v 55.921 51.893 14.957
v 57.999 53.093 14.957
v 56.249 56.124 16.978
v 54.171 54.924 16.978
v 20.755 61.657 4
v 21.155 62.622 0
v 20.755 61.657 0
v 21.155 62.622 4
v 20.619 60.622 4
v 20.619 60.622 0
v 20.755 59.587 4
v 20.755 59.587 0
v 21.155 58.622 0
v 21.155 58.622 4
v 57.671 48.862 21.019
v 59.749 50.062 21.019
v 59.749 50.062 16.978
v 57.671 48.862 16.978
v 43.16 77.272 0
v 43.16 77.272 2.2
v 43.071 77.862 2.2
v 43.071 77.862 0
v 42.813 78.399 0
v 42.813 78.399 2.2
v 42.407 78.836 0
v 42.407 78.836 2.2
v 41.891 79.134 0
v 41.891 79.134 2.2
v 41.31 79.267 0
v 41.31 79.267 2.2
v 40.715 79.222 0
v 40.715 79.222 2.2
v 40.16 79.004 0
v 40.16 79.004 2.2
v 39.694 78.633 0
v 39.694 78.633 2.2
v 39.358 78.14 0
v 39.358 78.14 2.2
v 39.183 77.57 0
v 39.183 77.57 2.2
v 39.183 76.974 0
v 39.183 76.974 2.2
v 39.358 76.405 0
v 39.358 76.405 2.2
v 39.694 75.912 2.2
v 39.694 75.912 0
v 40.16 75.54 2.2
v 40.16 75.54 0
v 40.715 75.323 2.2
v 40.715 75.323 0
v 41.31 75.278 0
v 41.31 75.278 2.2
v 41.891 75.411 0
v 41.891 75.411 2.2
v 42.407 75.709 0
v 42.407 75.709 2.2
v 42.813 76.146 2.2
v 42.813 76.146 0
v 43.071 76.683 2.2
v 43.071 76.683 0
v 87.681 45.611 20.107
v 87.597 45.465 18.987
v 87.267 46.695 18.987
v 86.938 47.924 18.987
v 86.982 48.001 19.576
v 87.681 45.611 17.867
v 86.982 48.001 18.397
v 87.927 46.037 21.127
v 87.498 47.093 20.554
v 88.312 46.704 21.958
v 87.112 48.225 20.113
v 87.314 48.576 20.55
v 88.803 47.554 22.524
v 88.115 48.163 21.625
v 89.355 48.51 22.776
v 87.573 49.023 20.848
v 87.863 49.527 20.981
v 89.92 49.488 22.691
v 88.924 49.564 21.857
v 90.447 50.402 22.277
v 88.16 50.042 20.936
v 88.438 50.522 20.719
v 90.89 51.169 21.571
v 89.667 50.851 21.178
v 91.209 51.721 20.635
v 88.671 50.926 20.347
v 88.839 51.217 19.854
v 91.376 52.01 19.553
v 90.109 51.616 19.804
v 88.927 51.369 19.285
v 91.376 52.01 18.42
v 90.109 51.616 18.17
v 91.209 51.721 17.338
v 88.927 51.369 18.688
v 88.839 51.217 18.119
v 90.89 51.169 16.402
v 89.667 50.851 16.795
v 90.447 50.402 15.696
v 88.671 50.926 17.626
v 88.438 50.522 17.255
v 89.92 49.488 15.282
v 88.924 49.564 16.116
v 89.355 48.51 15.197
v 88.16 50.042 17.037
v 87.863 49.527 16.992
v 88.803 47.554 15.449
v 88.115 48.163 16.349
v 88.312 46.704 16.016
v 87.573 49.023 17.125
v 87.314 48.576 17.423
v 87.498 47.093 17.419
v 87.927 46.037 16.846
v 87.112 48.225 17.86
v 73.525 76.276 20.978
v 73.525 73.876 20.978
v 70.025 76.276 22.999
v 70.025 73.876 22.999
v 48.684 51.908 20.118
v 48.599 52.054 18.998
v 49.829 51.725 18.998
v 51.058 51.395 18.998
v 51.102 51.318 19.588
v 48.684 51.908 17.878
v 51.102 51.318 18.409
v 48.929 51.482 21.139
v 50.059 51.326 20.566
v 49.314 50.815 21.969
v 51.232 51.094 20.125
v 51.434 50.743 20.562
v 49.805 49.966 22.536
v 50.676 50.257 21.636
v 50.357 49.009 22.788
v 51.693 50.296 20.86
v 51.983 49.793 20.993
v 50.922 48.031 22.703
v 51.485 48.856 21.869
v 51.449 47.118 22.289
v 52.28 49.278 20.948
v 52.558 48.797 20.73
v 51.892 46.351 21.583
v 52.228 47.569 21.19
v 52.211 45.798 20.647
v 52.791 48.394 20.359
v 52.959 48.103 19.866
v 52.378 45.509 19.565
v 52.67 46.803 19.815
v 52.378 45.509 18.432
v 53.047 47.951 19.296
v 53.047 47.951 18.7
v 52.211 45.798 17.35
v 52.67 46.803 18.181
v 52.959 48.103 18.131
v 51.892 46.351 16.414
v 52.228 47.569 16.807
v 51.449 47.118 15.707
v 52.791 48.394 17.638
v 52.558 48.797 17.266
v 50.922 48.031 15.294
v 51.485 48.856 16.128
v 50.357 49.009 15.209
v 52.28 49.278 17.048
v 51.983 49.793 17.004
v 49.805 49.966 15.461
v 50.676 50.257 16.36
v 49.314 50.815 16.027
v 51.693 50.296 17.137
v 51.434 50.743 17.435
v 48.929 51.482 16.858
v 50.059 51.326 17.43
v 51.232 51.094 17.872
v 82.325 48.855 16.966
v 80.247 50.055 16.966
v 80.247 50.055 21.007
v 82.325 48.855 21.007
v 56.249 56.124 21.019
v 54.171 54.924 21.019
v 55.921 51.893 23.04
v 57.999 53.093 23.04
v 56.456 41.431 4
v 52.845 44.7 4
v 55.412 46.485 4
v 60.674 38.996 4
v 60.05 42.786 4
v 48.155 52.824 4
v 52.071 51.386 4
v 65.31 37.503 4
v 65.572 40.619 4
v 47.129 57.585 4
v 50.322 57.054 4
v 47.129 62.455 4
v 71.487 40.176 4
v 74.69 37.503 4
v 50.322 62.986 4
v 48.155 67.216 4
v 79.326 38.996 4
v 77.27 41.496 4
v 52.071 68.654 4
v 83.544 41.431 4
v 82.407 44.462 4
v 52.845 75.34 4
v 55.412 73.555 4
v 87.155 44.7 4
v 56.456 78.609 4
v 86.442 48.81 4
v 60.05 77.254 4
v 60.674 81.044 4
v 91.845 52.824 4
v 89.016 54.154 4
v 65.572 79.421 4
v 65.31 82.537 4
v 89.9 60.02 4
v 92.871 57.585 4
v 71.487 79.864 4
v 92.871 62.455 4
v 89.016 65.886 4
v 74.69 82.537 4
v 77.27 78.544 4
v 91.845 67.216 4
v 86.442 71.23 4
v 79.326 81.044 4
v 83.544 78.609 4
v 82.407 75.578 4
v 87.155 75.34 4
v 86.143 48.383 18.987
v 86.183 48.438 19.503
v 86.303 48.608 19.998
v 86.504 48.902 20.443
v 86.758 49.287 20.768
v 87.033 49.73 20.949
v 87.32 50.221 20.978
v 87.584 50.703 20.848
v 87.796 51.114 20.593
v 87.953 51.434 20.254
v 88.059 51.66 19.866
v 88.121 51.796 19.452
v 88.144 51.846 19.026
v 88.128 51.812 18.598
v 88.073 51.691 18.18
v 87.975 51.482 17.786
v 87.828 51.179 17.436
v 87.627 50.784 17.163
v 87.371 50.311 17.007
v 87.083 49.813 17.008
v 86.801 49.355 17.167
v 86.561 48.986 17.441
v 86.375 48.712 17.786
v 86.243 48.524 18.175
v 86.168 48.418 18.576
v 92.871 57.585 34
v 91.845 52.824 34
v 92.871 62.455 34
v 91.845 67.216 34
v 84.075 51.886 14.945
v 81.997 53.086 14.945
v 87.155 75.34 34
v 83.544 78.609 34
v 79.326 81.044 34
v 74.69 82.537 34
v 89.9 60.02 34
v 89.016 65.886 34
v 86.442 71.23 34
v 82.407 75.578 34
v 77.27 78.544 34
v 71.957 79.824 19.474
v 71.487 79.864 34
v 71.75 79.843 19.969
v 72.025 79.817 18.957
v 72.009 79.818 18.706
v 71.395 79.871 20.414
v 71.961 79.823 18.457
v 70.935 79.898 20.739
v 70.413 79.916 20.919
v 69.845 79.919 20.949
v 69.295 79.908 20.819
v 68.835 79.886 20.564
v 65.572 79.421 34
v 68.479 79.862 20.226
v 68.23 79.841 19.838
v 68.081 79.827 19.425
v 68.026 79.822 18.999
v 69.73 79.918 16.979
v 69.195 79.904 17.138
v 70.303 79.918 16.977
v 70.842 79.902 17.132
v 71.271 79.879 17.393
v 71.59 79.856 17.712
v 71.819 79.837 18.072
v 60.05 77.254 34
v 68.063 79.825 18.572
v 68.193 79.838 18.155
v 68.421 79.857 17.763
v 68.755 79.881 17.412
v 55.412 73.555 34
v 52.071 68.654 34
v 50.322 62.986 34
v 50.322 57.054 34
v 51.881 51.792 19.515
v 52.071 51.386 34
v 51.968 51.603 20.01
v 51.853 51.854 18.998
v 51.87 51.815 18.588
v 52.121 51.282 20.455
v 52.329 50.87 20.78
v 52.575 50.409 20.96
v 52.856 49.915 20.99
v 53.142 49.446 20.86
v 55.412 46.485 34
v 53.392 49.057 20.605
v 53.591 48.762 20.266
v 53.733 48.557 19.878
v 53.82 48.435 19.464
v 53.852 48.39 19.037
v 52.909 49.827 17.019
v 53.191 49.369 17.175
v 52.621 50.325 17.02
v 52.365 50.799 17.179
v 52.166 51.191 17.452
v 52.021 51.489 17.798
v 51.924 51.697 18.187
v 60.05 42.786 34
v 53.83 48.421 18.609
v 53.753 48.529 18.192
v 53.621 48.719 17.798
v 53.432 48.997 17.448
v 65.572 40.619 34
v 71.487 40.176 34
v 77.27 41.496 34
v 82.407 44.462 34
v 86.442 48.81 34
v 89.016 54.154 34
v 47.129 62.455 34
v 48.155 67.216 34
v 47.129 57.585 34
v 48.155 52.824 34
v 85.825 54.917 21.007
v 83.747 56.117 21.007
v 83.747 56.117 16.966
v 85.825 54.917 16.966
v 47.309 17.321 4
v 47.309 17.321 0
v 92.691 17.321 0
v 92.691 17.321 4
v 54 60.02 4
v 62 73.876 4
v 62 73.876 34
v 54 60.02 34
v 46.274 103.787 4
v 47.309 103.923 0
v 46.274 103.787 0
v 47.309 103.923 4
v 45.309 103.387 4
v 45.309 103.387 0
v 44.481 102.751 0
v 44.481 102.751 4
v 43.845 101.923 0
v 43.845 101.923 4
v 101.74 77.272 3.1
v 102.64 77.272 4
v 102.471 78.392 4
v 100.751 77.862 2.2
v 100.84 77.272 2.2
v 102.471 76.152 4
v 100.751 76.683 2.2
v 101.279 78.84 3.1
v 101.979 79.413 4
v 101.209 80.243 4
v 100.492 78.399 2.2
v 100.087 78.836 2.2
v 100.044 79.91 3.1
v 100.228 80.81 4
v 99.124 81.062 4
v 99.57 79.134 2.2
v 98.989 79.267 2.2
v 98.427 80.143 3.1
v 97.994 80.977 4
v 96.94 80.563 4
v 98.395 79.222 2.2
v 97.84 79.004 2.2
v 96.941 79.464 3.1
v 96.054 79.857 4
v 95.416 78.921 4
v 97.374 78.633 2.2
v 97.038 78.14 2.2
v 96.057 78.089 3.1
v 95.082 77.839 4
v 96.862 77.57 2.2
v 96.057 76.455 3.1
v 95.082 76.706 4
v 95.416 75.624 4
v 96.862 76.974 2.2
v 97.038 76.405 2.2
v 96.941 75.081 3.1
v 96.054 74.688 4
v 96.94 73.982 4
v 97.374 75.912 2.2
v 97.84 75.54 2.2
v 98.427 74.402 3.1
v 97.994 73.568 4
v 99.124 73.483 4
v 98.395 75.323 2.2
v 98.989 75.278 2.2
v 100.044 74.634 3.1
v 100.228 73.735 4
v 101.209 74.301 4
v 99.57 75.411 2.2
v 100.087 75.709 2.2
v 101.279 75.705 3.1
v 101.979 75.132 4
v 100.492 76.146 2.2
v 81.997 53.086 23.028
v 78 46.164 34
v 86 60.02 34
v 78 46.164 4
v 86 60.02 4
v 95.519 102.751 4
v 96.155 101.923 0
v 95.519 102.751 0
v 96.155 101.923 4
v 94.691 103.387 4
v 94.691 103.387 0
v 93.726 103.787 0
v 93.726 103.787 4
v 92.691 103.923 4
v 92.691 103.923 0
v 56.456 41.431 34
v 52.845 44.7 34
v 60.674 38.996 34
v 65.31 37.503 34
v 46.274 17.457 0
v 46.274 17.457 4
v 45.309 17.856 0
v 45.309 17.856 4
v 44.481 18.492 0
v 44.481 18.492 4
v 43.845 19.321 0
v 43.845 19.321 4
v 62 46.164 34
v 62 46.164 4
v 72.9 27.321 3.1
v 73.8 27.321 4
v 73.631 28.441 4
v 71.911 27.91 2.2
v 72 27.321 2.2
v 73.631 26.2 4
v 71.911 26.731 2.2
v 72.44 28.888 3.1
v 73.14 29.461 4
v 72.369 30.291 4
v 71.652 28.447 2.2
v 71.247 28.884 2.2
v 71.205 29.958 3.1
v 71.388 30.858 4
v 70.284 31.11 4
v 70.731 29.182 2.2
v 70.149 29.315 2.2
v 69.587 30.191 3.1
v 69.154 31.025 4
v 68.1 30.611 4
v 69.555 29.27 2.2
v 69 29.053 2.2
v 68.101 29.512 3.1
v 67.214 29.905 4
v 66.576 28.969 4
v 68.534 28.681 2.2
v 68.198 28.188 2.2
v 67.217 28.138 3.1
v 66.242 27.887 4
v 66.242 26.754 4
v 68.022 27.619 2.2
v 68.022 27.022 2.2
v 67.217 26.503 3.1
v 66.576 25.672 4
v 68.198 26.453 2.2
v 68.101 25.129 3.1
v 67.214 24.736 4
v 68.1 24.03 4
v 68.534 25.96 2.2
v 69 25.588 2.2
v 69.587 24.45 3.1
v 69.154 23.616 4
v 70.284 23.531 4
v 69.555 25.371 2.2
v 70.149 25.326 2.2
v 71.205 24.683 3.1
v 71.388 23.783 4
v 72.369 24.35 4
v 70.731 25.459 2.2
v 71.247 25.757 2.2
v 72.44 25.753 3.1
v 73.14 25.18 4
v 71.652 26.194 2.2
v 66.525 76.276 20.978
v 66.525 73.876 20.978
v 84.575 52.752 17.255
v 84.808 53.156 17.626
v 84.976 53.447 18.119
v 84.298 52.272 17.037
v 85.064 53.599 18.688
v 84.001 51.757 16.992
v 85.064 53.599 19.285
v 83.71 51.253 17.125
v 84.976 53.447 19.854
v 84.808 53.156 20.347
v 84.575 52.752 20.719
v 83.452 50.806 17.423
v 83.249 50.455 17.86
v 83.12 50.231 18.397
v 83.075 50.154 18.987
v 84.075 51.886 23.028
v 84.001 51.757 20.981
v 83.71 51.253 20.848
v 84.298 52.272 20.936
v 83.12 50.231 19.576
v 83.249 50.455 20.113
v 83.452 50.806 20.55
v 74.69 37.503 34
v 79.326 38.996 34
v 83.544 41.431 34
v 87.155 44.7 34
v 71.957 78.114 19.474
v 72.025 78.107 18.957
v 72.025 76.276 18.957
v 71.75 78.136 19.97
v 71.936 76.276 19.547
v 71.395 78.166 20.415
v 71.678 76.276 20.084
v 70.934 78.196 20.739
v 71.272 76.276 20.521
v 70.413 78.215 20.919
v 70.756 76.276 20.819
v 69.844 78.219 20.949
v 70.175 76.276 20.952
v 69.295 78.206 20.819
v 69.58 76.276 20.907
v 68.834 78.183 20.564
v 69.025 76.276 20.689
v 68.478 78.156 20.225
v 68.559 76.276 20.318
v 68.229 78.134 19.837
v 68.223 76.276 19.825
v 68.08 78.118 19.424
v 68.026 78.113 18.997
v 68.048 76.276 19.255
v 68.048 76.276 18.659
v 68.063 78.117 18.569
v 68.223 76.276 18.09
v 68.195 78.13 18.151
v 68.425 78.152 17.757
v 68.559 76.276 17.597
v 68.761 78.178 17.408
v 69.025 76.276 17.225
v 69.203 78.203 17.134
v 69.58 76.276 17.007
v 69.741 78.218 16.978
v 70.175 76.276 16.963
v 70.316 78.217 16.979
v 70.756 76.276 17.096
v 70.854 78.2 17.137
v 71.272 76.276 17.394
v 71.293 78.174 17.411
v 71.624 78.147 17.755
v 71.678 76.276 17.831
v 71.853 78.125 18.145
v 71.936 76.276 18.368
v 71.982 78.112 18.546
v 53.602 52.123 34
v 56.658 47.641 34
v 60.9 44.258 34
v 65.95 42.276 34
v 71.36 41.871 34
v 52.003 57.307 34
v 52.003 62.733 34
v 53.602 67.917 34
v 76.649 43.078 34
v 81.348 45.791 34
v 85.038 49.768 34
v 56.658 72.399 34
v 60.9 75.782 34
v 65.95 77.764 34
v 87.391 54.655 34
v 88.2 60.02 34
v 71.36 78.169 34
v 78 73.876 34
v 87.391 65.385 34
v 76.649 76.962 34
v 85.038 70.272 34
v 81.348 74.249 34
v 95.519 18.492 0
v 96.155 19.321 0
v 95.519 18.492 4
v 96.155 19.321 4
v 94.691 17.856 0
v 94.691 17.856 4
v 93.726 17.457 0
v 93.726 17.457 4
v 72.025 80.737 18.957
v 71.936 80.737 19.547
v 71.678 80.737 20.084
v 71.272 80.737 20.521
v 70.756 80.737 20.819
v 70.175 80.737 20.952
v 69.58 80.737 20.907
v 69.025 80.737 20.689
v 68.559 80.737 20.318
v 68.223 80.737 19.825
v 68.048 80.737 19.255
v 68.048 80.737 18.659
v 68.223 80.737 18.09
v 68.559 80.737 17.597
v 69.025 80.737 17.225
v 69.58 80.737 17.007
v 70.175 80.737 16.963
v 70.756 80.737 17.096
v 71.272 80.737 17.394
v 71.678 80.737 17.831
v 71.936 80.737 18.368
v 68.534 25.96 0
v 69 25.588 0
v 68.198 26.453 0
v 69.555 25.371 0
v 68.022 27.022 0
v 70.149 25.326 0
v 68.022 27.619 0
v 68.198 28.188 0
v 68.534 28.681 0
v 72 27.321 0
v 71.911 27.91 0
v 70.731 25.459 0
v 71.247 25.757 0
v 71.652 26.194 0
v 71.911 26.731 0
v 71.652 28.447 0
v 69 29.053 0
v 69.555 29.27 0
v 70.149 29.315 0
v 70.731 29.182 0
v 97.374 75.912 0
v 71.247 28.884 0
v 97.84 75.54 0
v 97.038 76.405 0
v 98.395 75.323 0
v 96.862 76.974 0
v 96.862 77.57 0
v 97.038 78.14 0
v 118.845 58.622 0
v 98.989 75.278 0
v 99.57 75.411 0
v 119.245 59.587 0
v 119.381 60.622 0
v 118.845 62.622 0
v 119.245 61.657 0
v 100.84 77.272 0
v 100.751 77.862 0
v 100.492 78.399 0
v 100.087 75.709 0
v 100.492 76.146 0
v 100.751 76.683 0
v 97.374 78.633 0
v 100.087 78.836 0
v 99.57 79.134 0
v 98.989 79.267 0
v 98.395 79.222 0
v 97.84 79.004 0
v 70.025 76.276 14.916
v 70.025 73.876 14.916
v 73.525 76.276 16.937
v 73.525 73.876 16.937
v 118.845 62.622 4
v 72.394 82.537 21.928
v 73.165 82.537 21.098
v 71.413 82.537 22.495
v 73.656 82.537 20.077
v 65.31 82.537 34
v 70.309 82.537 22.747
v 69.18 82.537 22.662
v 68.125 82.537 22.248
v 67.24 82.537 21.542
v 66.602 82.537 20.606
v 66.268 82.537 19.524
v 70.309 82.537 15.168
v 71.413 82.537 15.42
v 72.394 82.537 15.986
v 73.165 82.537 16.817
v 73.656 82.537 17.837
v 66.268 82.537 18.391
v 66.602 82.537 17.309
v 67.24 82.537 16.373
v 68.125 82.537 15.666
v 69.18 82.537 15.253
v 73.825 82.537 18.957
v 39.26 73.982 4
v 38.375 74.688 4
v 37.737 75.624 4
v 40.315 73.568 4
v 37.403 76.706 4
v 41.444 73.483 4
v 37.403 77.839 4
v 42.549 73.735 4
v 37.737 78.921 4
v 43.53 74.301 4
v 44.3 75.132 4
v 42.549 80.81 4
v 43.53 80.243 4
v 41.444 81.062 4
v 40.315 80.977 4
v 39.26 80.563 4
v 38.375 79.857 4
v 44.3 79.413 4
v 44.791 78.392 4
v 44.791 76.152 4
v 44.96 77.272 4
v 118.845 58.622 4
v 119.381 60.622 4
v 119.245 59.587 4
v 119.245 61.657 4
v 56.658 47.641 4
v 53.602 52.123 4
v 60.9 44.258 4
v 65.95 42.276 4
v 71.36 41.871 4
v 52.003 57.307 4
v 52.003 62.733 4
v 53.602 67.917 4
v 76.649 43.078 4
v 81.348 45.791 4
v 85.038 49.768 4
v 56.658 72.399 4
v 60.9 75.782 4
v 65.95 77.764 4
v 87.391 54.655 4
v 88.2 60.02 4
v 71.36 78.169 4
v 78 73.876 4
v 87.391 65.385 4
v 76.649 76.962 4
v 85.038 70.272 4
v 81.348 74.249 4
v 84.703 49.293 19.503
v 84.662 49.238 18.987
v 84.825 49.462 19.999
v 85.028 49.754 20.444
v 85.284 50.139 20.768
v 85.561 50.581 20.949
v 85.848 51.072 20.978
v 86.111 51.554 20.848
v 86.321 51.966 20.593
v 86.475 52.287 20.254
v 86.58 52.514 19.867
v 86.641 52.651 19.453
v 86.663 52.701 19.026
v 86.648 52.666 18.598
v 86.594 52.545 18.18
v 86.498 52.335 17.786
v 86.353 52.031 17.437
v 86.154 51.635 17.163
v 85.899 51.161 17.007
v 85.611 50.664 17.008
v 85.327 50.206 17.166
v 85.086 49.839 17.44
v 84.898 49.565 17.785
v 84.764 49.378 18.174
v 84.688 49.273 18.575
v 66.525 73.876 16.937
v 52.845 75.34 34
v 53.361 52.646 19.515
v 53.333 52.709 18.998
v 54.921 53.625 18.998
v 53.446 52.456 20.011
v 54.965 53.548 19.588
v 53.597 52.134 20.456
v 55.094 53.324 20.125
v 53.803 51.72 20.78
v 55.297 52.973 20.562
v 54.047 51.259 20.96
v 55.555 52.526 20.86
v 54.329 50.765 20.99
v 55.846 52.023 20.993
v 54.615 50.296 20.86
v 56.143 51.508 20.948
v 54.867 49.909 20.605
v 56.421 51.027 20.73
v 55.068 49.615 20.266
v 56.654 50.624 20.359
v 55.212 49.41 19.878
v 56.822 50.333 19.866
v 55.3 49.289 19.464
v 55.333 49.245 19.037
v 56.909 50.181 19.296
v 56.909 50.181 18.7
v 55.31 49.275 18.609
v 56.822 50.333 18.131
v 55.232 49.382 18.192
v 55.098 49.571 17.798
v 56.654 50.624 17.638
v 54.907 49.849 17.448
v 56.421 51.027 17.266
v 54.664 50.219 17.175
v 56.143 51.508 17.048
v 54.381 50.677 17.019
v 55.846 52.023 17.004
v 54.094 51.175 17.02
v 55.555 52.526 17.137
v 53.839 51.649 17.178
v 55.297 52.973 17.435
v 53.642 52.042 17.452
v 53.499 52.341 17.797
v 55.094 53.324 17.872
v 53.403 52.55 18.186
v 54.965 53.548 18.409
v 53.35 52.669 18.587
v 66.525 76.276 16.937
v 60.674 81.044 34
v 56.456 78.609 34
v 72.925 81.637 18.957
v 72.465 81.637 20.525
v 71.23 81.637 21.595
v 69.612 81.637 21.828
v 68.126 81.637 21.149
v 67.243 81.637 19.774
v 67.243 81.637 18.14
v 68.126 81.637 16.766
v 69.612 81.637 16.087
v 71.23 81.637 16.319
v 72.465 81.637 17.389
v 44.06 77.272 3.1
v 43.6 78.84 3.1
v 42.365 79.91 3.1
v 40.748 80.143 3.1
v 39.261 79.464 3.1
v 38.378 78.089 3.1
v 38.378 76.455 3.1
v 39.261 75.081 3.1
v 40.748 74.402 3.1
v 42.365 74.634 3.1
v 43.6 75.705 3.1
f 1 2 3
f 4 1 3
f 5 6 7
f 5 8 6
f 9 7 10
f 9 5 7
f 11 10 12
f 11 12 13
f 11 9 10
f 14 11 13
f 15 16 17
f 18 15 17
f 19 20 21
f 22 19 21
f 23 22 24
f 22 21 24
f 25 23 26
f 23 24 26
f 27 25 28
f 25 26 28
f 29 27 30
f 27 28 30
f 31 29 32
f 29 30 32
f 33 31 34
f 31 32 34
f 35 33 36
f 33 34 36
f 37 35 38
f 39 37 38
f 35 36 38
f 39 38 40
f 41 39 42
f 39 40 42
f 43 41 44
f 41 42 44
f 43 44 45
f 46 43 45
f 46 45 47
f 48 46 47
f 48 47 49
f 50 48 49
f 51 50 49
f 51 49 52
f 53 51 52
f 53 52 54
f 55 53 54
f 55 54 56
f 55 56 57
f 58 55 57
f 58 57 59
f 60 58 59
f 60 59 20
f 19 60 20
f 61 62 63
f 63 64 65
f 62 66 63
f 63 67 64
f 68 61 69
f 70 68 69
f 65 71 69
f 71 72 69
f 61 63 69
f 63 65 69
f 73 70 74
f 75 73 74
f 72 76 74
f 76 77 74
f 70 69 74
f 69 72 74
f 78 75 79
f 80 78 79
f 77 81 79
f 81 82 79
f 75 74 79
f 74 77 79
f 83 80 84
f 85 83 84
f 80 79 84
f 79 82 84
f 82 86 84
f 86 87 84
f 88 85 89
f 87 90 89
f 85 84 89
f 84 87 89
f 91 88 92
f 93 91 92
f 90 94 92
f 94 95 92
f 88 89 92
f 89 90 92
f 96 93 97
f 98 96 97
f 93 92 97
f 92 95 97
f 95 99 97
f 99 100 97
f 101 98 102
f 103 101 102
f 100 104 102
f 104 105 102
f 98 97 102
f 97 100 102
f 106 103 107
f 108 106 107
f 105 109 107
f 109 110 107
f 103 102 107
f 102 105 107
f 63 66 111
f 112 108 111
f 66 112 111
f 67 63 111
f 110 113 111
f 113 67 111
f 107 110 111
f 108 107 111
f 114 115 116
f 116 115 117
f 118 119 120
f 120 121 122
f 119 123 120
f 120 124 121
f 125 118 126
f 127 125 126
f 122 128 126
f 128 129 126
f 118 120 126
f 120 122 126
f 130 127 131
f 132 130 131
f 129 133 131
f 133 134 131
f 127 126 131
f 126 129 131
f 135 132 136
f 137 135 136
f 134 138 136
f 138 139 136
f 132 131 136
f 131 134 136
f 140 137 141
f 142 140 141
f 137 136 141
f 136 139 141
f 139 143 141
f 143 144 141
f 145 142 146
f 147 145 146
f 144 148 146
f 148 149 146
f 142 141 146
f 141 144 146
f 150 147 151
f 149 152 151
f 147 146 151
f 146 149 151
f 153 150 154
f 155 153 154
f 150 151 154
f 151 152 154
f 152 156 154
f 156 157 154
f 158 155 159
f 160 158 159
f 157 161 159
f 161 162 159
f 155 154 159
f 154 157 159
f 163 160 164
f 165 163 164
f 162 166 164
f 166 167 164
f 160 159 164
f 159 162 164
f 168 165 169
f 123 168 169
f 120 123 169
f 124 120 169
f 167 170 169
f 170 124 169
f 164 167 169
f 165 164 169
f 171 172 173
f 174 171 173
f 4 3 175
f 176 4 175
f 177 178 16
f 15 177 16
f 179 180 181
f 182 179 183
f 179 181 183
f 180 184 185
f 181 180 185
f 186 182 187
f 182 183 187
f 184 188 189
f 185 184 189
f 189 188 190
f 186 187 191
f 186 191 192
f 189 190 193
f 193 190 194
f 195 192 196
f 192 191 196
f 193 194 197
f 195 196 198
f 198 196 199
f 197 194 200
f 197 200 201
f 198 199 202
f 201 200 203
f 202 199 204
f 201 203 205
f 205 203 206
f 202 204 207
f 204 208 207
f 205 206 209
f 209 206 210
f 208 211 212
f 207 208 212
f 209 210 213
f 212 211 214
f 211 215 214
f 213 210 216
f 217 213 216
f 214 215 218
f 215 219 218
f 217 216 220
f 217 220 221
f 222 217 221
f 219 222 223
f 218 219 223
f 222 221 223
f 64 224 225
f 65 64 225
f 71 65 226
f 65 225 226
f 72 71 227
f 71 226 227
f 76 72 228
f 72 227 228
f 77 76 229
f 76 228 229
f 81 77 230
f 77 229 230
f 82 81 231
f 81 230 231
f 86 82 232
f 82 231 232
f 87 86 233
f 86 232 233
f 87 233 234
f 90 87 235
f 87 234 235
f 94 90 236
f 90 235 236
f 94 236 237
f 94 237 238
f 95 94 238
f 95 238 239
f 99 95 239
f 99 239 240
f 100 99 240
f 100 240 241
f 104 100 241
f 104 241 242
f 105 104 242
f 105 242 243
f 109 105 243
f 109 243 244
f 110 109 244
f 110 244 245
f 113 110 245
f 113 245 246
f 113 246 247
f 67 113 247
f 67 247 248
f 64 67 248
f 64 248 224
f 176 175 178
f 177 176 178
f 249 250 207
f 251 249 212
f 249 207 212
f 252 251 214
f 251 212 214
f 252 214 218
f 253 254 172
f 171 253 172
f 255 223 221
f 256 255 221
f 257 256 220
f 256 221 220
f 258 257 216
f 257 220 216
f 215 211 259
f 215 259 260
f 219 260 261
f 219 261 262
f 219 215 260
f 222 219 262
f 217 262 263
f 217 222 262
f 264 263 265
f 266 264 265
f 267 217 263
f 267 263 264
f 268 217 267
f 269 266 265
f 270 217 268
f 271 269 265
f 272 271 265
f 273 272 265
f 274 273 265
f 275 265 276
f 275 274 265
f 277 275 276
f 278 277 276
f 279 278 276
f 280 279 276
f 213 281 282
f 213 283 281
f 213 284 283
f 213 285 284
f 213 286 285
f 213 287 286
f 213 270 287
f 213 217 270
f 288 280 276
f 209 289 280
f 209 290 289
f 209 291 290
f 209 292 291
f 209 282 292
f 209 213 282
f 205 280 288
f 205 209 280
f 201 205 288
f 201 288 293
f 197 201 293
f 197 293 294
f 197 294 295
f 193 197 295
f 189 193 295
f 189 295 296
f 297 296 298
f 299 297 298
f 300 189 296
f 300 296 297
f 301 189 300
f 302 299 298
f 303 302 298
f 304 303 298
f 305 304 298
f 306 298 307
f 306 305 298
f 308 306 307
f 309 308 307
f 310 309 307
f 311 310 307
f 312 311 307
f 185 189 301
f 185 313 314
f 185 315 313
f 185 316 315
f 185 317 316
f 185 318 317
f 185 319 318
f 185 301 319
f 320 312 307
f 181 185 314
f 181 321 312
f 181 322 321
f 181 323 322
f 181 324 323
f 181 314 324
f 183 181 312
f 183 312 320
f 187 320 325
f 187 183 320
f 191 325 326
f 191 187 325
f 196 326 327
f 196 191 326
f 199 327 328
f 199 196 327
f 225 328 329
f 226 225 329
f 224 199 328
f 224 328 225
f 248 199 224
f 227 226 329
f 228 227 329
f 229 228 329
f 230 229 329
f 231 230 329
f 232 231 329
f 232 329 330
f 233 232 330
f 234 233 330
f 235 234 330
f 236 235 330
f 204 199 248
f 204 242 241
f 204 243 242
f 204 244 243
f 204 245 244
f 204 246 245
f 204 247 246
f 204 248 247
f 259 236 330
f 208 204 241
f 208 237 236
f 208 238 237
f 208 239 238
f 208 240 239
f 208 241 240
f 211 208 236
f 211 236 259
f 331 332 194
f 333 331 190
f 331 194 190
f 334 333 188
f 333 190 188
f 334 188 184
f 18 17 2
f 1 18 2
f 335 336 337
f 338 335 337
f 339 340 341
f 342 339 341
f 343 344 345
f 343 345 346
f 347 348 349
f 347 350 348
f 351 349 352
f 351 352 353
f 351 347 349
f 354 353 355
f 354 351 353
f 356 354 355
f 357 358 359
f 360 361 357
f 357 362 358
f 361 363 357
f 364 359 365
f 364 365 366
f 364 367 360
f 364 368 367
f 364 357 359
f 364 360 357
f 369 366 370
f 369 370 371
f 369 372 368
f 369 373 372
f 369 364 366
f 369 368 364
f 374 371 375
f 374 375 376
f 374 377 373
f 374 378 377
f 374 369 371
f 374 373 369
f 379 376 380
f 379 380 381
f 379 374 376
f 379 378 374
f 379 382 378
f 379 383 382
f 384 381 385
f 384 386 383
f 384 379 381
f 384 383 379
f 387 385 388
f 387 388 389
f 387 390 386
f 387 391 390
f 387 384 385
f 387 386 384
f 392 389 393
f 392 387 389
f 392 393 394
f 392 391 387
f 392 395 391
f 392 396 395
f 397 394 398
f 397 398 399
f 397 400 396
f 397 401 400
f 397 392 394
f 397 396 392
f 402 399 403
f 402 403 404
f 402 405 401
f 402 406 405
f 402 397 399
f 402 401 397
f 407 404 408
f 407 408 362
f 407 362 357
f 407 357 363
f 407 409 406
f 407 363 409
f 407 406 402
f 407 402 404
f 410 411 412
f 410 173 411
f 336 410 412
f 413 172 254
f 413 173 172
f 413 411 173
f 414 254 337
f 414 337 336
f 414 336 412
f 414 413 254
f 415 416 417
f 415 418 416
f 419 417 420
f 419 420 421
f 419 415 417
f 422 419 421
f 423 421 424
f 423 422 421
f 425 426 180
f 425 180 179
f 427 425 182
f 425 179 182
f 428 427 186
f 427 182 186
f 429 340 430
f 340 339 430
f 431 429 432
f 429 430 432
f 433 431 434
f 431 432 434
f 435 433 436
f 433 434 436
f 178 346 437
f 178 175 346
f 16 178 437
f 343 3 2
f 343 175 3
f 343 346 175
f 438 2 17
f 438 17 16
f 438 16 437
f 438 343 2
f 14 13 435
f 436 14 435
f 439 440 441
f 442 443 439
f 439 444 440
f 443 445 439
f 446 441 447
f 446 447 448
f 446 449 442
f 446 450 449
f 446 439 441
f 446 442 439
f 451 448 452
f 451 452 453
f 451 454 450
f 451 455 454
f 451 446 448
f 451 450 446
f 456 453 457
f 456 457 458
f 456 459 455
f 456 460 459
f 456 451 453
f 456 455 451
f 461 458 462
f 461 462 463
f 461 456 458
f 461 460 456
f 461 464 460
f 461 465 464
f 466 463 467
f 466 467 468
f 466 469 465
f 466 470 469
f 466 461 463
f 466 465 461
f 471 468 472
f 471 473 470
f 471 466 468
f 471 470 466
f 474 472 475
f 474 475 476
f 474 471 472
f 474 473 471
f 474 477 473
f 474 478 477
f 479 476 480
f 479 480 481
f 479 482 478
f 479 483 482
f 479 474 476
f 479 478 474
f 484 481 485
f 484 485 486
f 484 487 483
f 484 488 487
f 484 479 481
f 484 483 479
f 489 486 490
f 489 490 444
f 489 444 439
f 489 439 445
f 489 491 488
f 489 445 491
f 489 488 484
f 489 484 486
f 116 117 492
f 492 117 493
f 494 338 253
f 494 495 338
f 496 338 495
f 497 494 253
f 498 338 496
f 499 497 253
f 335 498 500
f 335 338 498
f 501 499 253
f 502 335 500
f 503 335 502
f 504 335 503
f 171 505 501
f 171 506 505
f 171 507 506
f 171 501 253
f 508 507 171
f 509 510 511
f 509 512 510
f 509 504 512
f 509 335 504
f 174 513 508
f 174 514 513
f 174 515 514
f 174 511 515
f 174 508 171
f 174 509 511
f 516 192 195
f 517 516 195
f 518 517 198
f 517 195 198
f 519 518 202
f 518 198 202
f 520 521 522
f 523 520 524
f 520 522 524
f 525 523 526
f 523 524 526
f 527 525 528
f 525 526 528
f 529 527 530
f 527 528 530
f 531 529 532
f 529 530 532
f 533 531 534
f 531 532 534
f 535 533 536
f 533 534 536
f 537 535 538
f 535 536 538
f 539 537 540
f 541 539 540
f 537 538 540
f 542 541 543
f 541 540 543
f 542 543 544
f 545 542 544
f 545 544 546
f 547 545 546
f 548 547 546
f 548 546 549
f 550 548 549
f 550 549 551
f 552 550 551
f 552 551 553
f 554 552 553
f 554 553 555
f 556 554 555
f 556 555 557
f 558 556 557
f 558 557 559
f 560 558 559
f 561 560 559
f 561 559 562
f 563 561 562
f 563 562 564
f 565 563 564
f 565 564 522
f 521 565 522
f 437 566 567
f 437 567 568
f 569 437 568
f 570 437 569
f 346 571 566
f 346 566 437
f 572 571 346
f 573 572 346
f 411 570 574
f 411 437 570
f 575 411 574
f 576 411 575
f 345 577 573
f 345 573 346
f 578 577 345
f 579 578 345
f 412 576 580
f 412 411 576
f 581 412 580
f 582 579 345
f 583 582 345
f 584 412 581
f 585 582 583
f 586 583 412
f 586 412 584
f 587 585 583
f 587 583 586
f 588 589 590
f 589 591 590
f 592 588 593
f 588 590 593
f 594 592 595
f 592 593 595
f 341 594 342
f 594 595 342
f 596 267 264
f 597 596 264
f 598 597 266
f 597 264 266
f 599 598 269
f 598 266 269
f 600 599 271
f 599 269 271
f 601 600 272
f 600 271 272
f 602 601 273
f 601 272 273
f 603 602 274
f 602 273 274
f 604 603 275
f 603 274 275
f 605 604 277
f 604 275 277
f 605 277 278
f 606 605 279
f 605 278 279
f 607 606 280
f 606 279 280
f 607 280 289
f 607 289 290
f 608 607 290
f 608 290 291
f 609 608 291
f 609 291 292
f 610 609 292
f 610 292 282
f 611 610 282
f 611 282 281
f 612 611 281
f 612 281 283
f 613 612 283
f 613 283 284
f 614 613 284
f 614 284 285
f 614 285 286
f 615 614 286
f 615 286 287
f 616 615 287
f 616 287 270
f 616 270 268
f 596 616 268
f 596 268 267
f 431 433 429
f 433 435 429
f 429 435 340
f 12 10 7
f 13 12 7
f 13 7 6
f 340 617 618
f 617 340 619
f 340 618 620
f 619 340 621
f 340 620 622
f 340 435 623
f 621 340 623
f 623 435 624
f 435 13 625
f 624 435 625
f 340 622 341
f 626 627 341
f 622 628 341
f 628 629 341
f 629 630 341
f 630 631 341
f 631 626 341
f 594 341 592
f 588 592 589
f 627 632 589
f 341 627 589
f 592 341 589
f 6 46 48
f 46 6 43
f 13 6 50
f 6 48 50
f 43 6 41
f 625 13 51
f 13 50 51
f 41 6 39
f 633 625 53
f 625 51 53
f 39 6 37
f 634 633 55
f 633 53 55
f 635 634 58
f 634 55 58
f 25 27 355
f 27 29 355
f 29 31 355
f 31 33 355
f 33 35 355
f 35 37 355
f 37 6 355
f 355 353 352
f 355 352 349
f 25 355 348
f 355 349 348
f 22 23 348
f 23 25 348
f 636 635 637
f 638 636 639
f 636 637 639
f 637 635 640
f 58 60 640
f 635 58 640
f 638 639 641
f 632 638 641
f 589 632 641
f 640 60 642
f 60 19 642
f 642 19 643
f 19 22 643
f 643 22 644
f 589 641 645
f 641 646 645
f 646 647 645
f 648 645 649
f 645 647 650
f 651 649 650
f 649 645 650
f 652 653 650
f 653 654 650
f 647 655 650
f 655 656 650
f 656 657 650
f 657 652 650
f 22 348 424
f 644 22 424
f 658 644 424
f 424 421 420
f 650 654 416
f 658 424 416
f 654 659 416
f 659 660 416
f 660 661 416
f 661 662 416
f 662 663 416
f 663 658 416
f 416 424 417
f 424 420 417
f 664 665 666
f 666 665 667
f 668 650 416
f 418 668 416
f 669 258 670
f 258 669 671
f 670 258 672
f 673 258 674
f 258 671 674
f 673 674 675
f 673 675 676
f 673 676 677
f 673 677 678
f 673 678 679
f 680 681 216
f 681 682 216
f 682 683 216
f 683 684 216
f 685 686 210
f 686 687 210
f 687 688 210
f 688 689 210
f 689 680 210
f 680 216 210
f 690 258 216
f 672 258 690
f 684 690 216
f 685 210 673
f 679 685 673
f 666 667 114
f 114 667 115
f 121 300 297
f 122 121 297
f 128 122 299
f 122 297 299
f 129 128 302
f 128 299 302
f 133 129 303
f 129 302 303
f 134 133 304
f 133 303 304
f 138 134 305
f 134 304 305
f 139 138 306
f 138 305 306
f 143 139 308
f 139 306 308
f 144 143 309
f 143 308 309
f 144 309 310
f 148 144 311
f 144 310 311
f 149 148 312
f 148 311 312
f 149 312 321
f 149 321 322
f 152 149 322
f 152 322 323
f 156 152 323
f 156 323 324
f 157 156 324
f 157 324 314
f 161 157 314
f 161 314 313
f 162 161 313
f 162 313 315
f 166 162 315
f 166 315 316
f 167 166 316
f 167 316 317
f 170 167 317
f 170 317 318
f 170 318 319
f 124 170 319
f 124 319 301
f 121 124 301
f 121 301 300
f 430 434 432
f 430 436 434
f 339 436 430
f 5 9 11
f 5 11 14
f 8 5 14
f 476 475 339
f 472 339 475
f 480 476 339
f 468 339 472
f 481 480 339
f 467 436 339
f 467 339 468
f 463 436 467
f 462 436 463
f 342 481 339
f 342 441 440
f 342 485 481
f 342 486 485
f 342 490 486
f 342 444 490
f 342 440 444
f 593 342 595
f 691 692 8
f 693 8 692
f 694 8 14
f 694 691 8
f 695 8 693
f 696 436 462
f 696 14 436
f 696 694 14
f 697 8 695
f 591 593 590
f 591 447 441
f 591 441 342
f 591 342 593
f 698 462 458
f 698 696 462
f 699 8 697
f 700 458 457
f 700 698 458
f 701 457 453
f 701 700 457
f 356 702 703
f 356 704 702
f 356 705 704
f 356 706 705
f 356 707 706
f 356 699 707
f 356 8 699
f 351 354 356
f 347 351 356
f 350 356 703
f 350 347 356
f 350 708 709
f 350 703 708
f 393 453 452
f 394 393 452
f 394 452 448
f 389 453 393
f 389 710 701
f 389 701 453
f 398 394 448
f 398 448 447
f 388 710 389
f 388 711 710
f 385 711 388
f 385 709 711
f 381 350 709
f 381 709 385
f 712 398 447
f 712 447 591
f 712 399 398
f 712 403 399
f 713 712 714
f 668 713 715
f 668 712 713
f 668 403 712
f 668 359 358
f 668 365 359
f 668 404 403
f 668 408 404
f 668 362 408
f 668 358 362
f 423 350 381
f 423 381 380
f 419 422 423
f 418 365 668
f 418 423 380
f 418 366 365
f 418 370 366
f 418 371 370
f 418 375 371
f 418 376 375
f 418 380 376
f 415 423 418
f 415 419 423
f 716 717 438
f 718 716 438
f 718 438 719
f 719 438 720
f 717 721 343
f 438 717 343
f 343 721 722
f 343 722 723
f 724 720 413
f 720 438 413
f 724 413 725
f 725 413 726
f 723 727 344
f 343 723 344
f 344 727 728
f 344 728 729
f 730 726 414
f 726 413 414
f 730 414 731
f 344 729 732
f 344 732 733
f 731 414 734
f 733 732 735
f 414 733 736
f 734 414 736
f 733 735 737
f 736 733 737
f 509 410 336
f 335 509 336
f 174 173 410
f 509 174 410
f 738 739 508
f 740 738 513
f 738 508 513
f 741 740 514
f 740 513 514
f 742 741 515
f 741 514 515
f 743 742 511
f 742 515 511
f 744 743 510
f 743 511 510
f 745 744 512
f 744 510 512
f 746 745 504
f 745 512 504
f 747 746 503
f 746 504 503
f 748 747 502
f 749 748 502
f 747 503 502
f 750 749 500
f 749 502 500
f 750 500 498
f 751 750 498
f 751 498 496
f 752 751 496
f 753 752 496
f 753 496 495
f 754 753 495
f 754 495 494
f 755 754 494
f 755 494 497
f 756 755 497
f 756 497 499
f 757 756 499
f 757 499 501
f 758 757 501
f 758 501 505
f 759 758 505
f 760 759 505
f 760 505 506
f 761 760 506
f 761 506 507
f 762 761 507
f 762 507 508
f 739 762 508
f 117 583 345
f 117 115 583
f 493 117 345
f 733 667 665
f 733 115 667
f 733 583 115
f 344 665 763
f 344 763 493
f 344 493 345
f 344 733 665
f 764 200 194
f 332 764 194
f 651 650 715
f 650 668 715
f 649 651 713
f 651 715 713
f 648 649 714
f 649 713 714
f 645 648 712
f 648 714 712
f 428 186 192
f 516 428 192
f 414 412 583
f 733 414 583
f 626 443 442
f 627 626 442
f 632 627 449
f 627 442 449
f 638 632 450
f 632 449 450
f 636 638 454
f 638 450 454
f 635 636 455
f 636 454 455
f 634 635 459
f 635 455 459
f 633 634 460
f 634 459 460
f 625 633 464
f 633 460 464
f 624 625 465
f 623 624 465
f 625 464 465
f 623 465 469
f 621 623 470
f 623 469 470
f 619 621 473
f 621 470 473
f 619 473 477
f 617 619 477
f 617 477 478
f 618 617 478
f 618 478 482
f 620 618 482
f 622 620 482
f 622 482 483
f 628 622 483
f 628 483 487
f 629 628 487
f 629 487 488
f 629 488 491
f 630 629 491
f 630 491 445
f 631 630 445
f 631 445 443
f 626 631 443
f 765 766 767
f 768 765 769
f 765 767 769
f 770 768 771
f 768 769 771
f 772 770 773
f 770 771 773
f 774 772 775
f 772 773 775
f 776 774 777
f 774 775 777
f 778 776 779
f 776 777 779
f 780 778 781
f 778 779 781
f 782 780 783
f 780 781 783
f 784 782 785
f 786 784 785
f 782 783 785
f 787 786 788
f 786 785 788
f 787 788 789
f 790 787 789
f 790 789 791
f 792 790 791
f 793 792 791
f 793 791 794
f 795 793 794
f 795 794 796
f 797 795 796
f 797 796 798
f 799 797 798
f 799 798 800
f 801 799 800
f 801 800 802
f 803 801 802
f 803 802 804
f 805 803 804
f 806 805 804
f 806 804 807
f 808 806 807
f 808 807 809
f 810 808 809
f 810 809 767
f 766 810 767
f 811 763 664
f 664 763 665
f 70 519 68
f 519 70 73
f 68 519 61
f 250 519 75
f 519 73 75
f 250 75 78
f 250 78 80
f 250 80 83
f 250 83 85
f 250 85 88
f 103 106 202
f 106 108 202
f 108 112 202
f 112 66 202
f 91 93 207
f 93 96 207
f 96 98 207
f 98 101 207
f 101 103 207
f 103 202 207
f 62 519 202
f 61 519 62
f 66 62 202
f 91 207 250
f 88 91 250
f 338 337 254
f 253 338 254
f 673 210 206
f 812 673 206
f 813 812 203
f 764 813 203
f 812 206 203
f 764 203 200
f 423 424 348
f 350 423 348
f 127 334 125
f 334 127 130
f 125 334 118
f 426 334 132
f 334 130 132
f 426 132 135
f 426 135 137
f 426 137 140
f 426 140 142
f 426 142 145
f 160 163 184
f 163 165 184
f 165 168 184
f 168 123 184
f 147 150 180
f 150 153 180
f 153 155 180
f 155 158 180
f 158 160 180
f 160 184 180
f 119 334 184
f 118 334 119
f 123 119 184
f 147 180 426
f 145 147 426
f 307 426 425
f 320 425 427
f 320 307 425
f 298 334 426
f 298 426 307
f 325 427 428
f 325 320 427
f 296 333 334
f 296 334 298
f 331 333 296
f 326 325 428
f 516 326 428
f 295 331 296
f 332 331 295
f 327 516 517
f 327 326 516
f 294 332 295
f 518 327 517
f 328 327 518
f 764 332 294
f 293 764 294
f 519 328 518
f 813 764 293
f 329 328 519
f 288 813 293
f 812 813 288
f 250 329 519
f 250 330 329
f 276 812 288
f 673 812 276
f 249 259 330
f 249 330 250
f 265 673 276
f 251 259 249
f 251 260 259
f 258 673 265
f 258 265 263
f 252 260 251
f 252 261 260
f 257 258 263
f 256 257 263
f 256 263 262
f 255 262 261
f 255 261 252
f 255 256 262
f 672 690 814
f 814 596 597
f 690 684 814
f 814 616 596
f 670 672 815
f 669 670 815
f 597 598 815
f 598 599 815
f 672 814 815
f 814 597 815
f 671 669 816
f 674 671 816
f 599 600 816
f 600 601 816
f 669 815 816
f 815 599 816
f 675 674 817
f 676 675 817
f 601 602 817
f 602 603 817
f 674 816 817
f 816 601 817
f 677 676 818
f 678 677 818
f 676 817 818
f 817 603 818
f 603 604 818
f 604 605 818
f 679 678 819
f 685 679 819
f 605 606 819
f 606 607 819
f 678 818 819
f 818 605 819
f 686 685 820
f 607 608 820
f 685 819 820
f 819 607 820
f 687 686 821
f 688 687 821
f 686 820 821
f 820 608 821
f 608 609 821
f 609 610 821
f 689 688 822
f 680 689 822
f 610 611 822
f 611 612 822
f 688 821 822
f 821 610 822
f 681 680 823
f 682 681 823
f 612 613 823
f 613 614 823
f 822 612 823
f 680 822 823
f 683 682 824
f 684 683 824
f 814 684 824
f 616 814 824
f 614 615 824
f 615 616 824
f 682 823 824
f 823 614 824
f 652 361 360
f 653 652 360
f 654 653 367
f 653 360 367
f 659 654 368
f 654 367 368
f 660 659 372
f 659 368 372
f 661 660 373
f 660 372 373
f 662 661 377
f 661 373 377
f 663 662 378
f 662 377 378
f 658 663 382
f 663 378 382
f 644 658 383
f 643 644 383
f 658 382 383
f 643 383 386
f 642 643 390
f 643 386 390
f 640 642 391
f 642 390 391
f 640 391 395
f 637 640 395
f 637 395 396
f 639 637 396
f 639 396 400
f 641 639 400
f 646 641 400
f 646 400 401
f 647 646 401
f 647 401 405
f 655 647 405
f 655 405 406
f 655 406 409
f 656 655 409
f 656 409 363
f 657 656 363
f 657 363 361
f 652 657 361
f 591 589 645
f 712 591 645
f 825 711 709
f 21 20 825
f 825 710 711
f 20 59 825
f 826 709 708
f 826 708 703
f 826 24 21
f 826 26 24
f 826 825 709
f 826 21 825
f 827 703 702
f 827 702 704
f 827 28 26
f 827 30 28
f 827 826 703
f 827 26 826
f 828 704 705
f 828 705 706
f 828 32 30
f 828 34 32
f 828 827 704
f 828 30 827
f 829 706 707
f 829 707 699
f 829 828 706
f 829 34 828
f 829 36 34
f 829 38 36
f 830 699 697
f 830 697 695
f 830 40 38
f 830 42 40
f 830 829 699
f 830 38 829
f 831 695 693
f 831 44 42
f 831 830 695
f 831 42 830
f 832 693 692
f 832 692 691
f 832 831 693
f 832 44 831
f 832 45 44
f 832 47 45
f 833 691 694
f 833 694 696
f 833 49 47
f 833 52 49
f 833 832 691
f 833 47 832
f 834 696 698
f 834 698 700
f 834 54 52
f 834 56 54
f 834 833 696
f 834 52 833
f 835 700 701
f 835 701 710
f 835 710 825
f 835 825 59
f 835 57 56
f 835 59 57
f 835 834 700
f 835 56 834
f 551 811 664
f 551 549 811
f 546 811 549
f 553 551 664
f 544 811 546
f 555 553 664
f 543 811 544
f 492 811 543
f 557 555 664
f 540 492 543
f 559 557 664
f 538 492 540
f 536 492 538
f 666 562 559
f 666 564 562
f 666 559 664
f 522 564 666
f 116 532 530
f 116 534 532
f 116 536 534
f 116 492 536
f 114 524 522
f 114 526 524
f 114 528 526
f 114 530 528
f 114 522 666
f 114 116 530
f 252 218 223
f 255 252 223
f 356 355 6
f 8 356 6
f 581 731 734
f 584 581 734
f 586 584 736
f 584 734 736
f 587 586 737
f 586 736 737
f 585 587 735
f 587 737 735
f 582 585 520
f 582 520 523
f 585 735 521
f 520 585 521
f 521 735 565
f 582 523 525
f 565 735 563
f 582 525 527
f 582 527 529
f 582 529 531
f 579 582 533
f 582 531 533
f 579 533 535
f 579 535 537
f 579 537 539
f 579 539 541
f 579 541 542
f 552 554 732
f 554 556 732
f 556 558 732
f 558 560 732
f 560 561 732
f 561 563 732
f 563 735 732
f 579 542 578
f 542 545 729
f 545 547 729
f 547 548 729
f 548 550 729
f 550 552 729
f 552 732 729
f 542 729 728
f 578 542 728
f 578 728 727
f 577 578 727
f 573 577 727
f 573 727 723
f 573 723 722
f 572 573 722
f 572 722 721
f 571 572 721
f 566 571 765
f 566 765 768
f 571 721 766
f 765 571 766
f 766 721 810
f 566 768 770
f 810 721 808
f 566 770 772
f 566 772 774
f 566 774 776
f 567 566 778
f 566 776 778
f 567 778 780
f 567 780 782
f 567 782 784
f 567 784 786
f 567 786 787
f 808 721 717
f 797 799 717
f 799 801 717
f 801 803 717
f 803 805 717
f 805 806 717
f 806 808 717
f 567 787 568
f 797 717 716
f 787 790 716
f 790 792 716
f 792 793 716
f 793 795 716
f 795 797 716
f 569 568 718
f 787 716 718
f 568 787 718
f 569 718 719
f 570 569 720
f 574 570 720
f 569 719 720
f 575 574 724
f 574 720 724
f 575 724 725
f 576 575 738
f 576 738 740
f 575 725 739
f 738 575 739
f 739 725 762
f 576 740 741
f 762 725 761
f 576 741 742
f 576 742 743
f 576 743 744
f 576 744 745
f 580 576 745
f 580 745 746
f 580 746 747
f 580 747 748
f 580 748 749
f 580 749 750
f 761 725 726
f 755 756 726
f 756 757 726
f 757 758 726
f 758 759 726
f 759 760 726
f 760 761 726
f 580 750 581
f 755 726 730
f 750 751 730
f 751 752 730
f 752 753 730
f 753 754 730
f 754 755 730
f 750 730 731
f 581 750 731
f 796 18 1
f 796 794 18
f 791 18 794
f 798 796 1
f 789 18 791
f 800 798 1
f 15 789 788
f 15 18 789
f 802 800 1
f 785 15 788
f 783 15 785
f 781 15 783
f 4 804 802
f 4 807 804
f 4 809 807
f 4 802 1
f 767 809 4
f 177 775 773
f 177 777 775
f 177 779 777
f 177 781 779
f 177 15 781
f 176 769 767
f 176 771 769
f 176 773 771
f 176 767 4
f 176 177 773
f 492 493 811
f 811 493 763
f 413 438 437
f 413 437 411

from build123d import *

# Parameters (mm, degrees)
SKETCH008_AS_DRAWN_R                      = 2
EXTRUDE009_DEPTH                          = 10
EXTRUDE009_ONTO_SKETCH008_ROLL_ANGLE      = 90
EXTRUDE009_ONTO_SKETCH008_PLACEMENT_ANGLE = 120
SKETCH007_AS_DRAWN_R                      = 2
EXTRUDE008_DEPTH                          = 10
EXTRUDE008_ONTO_SKETCH007_ROLL_ANGLE      = 90
EXTRUDE008_ONTO_SKETCH007_PLACEMENT_ANGLE = -120
SKETCH006_R                               = 2
EXTRUDE007_DEPTH                          = 10
EXTRUDE006_DEPTH                          = 2.4
EXTRUDE006_ONTO_SKETCH005_ROLL_ANGLE      = 90
EXTRUDE006_ONTO_SKETCH005_PLACEMENT_ANGLE = -120
EXTRUDE005_DEPTH                          = 2.4
EXTRUDE005_ONTO_SKETCH004_ROLL_ANGLE      = 90
EXTRUDE005_ONTO_SKETCH004_PLACEMENT_ANGLE = 120
EXTRUDE004_DEPTH                          = 2.4
SKETCH001_R                               = 18.2
EXTRUDE001_DEPTH                          = 30
SKETCH002_R                               = 19.9
EXTRUDE002_DEPTH                          = 30
CHAMFER_SIZE                              = 1.8
SKETCH009_R                               = 2
EXTRUDE010_DEPTH                          = 10
EXTRUDE_DEPTH                             = 4
CHAMFER001_SIZE                           = 1.8
FILLET_R                                  = 4


with BuildPart() as extrude009:
    # Sketch008 as drawn → Extrude009 (new)
    with BuildSketch(Plane.XY):
        with Locations((16.9806321375, 18.9983442041)):
            Circle(SKETCH008_AS_DRAWN_R)
    extrude(amount=-EXTRUDE009_DEPTH)


with BuildPart() as extrude009_1:
    # Extrude009 onto Sketch008 roll: moved
    add(extrude009.part.rotate(Axis((0, 0, 0), (1, 0, 0)), EXTRUDE009_ONTO_SKETCH008_ROLL_ANGLE))


with BuildPart() as extrude009_2:
    # Extrude009 onto Sketch008 placement: moved
    add(extrude009_1.part.moved(Location((64.4109613985, 37.1876859022, 0))).rotate(Axis((64.4109613985, 37.1876859022, 0), (0, 0, 1)), EXTRUDE009_ONTO_SKETCH008_PLACEMENT_ANGLE))


with BuildPart() as extrude008:
    # Sketch007 as drawn → Extrude008 (new)
    with BuildSketch(Plane.XY):
        with Locations((-86.9724395653, 18.986573062)):
            Circle(SKETCH007_AS_DRAWN_R)
    extrude(amount=-EXTRUDE008_DEPTH)


with BuildPart() as extrude008_1:
    # Extrude008 onto Sketch007 roll: moved
    add(extrude008.part.rotate(Axis((0, 0, 0), (1, 0, 0)), EXTRUDE008_ONTO_SKETCH007_ROLL_ANGLE))


with BuildPart() as extrude008_2:
    # Extrude008 onto Sketch007 placement: moved
    add(extrude008_1.part.moved(Location((40.5890386015, -23.4340923627, 0))).rotate(Axis((40.5890386015, -23.4340923627, 0), (0, 0, 1)), EXTRUDE008_ONTO_SKETCH007_PLACEMENT_ANGLE))


with BuildPart() as extrude007:
    # Sketch006 (on Face29 of Cut002) → Extrude007 (new body)
    with BuildSketch(Plane.XZ.offset(-76.2764064606)):
        with Locations((70.0251825662, 18.9573489466)):
            Circle(SKETCH006_R)
    extrude(amount=-EXTRUDE007_DEPTH)


with BuildPart() as extrude006:
    # Sketch005 as drawn → Extrude006 (new)
    with BuildSketch(Plane.XY):
        Polygon((-86.9724395653, 14.9451211777), (-83.4724395653, 16.9658471198), (-83.4724395653, 21.0072990042), (-86.9724395653, 23.0280249463), (-90.4724395653, 21.0072990042), (-90.4724395653, 16.9658471198), align=None)
    extrude(amount=-EXTRUDE006_DEPTH)


with BuildPart() as extrude006_1:
    # Extrude006 onto Sketch005 roll: moved
    add(extrude006.part.rotate(Axis((0, 0, 0), (1, 0, 0)), EXTRUDE006_ONTO_SKETCH005_ROLL_ANGLE))


with BuildPart() as extrude006_2:
    # Extrude006 onto Sketch005 placement: moved
    add(extrude006_1.part.moved(Location((38.5105776324, -22.2340923627, 0))).rotate(Axis((38.5105776324, -22.2340923627, 0), (0, 0, 1)), EXTRUDE006_ONTO_SKETCH005_PLACEMENT_ANGLE))


with BuildPart() as extrude005:
    # Sketch004 as drawn → Extrude005 (new)
    with BuildSketch(Plane.XY):
        Polygon((16.9806321375, 14.9568923197), (20.4806321375, 16.9776182619), (20.4806321375, 21.0190701462), (16.9806321375, 23.0397960884), (13.4806321375, 21.0190701462), (13.4806321375, 16.9776182619), align=None)
    extrude(amount=-EXTRUDE005_DEPTH)


with BuildPart() as extrude005_1:
    # Extrude005 onto Sketch004 roll: moved
    add(extrude005.part.rotate(Axis((0, 0, 0), (1, 0, 0)), EXTRUDE005_ONTO_SKETCH004_ROLL_ANGLE))


with BuildPart() as extrude005_2:
    # Extrude005 onto Sketch004 placement: moved
    add(extrude005_1.part.moved(Location((66.4894223676, 38.3876859022, 0))).rotate(Axis((66.4894223676, 38.3876859022, 0), (0, 0, 1)), EXTRUDE005_ONTO_SKETCH004_PLACEMENT_ANGLE))


with BuildPart() as extrude004:
    # Sketch003 (on Face4 of Extrude001) → Extrude004 (new body)
    with BuildSketch(Plane.XZ.offset(-73.8764064606)):
        Polygon((70.0251825662, 14.9158970623), (73.5251825662, 16.9366230045), (73.5251825662, 20.9780748888), (70.0251825662, 22.9988008309), (66.5251825662, 20.9780748888), (66.5251825662, 16.9366230045), align=None)
    extrude(amount=-EXTRUDE004_DEPTH)


with BuildPart() as cut005:
    # Sketch001 (on Face8 of Extrude) → Extrude001 (new body)
    with BuildSketch(Plane.XY.offset(4)):
        with Locations((70, 60.02)):
            Circle(SKETCH001_R)
        Polygon((78, 46.1635935394), (86, 60.02), (78, 73.8764064606), (62, 73.8764064606), (54, 60.02), (62, 46.1635935394), align=None, mode=Mode.SUBTRACT)
    extrude(amount=EXTRUDE001_DEPTH)

    # Cut: cut Extrude004
    add(extrude004.part, mode=Mode.SUBTRACT)

    # Cut001: cut Extrude005
    add(extrude005_2.part, mode=Mode.SUBTRACT)

    # Cut002: cut Extrude006
    add(extrude006_2.part, mode=Mode.SUBTRACT)

    # Cut003: cut Extrude007
    add(extrude007.part, mode=Mode.SUBTRACT)

    # Cut004: cut Extrude008
    add(extrude008_2.part, mode=Mode.SUBTRACT)

    # Cut005: cut Extrude009
    add(extrude009_2.part, mode=Mode.SUBTRACT)


with BuildPart() as chamfer_body:
    # Sketch002 (on Face8 of Extrude) → Extrude002 (new body)
    with BuildSketch(Plane.XY.offset(4)):
        with BuildLine():
            Line((87.1547921201, 44.6996505485), (91.8452078799, 52.8236889531))
            ThreePointArc((91.8452078799, 52.8236889531), (93, 60.02), (91.8452078799, 67.2163110469))
            Line((91.8452078799, 67.2163110469), (87.1547921201, 75.3403494515))
            ThreePointArc((87.1547921201, 75.3403494515), (81.5, 79.938584287), (74.6904157598, 82.5366604984))
            Line((74.6904157598, 82.5366604984), (65.3095842402, 82.5366604984))
            ThreePointArc((65.3095842402, 82.5366604984), (58.5, 79.938584287), (52.8452078799, 75.3403494515))
            Line((52.8452078799, 75.3403494515), (48.1547921201, 67.2163110469))
            ThreePointArc((48.1547921201, 67.2163110469), (47, 60.02), (48.1547921201, 52.8236889531))
            Line((48.1547921201, 52.8236889531), (52.8452078799, 44.6996505485))
            ThreePointArc((52.8452078799, 44.6996505485), (58.5, 40.101415713), (65.3095842402, 37.5033395016))
            Line((65.3095842402, 37.5033395016), (74.6904157598, 37.5033395016))
            ThreePointArc((74.6904157598, 37.5033395016), (81.5, 40.101415713), (87.1547921201, 44.6996505485))
        make_face()
        with Locations((70, 60.02)):
            Circle(SKETCH002_R, mode=Mode.SUBTRACT)
    extrude(amount=EXTRUDE002_DEPTH)

    # Cut006: cut Extrude009
    add(extrude009_2.part, mode=Mode.SUBTRACT)

    # Cut007: cut Extrude007
    add(extrude007.part, mode=Mode.SUBTRACT)

    # Cut008: cut Extrude008
    add(extrude008_2.part, mode=Mode.SUBTRACT)

    # Chamfer
    chamfer_edges = [chamfer_body.edges().sort_by_distance(p)[0] for p in [
        (90.496797, 50.488174, 18.986573),
        (68.025183, 82.53666, 18.957349),
        (51.499106, 47.031167, 18.998344),
    ]]
    chamfer(chamfer_edges, length=CHAMFER_SIZE)


with BuildPart() as extrude010:
    # Sketch009 (on Face8 of Extrude) → Extrude010 (new body)
    with BuildSketch(Plane.XY.offset(4)):
        with Locations((98.8397459622, 77.2724130946)):
            Circle(SKETCH009_R)
        with Locations((41.1602540378, 77.2724130946)):
            Circle(SKETCH009_R)
        with Locations((70, 27.3205078108)):
            Circle(SKETCH009_R)
    extrude(amount=-EXTRUDE010_DEPTH)


with BuildPart() as fillet_body:
    # Sketch → Extrude (new body)
    with BuildSketch(Plane.XY):
        Polygon((120, 60.621778), (95, 103.9230481892), (45, 103.9230481892), (20, 60.621778), (45, 17.3205078108), (95, 17.3205078108), align=None)
    extrude(amount=EXTRUDE_DEPTH)

    # Cut009: cut Extrude010
    add(extrude010.part, mode=Mode.SUBTRACT)

    # Chamfer001
    chamfer001_edges = [fillet_body.edges().sort_by_distance(p)[0] for p in [
        (68, 27.320508, 4),
        (39.160254, 77.272413, 4),
        (96.839746, 77.272413, 4),
    ]]
    chamfer(chamfer001_edges, length=CHAMFER001_SIZE)

    # Fillet
    fillet_edges = [fillet_body.edges().sort_by_distance(p)[0] for p in [
        (120, 60.621778, 2),
        (95, 103.923048, 2),
        (95, 17.320508, 2),
        (45, 103.923048, 2),
        (45, 17.320508, 2),
        (20, 60.621778, 2),
    ]]
    fillet(fillet_edges, radius=FILLET_R)


solid = Compound([cut005.part, chamfer_body.part, fillet_body.part])
